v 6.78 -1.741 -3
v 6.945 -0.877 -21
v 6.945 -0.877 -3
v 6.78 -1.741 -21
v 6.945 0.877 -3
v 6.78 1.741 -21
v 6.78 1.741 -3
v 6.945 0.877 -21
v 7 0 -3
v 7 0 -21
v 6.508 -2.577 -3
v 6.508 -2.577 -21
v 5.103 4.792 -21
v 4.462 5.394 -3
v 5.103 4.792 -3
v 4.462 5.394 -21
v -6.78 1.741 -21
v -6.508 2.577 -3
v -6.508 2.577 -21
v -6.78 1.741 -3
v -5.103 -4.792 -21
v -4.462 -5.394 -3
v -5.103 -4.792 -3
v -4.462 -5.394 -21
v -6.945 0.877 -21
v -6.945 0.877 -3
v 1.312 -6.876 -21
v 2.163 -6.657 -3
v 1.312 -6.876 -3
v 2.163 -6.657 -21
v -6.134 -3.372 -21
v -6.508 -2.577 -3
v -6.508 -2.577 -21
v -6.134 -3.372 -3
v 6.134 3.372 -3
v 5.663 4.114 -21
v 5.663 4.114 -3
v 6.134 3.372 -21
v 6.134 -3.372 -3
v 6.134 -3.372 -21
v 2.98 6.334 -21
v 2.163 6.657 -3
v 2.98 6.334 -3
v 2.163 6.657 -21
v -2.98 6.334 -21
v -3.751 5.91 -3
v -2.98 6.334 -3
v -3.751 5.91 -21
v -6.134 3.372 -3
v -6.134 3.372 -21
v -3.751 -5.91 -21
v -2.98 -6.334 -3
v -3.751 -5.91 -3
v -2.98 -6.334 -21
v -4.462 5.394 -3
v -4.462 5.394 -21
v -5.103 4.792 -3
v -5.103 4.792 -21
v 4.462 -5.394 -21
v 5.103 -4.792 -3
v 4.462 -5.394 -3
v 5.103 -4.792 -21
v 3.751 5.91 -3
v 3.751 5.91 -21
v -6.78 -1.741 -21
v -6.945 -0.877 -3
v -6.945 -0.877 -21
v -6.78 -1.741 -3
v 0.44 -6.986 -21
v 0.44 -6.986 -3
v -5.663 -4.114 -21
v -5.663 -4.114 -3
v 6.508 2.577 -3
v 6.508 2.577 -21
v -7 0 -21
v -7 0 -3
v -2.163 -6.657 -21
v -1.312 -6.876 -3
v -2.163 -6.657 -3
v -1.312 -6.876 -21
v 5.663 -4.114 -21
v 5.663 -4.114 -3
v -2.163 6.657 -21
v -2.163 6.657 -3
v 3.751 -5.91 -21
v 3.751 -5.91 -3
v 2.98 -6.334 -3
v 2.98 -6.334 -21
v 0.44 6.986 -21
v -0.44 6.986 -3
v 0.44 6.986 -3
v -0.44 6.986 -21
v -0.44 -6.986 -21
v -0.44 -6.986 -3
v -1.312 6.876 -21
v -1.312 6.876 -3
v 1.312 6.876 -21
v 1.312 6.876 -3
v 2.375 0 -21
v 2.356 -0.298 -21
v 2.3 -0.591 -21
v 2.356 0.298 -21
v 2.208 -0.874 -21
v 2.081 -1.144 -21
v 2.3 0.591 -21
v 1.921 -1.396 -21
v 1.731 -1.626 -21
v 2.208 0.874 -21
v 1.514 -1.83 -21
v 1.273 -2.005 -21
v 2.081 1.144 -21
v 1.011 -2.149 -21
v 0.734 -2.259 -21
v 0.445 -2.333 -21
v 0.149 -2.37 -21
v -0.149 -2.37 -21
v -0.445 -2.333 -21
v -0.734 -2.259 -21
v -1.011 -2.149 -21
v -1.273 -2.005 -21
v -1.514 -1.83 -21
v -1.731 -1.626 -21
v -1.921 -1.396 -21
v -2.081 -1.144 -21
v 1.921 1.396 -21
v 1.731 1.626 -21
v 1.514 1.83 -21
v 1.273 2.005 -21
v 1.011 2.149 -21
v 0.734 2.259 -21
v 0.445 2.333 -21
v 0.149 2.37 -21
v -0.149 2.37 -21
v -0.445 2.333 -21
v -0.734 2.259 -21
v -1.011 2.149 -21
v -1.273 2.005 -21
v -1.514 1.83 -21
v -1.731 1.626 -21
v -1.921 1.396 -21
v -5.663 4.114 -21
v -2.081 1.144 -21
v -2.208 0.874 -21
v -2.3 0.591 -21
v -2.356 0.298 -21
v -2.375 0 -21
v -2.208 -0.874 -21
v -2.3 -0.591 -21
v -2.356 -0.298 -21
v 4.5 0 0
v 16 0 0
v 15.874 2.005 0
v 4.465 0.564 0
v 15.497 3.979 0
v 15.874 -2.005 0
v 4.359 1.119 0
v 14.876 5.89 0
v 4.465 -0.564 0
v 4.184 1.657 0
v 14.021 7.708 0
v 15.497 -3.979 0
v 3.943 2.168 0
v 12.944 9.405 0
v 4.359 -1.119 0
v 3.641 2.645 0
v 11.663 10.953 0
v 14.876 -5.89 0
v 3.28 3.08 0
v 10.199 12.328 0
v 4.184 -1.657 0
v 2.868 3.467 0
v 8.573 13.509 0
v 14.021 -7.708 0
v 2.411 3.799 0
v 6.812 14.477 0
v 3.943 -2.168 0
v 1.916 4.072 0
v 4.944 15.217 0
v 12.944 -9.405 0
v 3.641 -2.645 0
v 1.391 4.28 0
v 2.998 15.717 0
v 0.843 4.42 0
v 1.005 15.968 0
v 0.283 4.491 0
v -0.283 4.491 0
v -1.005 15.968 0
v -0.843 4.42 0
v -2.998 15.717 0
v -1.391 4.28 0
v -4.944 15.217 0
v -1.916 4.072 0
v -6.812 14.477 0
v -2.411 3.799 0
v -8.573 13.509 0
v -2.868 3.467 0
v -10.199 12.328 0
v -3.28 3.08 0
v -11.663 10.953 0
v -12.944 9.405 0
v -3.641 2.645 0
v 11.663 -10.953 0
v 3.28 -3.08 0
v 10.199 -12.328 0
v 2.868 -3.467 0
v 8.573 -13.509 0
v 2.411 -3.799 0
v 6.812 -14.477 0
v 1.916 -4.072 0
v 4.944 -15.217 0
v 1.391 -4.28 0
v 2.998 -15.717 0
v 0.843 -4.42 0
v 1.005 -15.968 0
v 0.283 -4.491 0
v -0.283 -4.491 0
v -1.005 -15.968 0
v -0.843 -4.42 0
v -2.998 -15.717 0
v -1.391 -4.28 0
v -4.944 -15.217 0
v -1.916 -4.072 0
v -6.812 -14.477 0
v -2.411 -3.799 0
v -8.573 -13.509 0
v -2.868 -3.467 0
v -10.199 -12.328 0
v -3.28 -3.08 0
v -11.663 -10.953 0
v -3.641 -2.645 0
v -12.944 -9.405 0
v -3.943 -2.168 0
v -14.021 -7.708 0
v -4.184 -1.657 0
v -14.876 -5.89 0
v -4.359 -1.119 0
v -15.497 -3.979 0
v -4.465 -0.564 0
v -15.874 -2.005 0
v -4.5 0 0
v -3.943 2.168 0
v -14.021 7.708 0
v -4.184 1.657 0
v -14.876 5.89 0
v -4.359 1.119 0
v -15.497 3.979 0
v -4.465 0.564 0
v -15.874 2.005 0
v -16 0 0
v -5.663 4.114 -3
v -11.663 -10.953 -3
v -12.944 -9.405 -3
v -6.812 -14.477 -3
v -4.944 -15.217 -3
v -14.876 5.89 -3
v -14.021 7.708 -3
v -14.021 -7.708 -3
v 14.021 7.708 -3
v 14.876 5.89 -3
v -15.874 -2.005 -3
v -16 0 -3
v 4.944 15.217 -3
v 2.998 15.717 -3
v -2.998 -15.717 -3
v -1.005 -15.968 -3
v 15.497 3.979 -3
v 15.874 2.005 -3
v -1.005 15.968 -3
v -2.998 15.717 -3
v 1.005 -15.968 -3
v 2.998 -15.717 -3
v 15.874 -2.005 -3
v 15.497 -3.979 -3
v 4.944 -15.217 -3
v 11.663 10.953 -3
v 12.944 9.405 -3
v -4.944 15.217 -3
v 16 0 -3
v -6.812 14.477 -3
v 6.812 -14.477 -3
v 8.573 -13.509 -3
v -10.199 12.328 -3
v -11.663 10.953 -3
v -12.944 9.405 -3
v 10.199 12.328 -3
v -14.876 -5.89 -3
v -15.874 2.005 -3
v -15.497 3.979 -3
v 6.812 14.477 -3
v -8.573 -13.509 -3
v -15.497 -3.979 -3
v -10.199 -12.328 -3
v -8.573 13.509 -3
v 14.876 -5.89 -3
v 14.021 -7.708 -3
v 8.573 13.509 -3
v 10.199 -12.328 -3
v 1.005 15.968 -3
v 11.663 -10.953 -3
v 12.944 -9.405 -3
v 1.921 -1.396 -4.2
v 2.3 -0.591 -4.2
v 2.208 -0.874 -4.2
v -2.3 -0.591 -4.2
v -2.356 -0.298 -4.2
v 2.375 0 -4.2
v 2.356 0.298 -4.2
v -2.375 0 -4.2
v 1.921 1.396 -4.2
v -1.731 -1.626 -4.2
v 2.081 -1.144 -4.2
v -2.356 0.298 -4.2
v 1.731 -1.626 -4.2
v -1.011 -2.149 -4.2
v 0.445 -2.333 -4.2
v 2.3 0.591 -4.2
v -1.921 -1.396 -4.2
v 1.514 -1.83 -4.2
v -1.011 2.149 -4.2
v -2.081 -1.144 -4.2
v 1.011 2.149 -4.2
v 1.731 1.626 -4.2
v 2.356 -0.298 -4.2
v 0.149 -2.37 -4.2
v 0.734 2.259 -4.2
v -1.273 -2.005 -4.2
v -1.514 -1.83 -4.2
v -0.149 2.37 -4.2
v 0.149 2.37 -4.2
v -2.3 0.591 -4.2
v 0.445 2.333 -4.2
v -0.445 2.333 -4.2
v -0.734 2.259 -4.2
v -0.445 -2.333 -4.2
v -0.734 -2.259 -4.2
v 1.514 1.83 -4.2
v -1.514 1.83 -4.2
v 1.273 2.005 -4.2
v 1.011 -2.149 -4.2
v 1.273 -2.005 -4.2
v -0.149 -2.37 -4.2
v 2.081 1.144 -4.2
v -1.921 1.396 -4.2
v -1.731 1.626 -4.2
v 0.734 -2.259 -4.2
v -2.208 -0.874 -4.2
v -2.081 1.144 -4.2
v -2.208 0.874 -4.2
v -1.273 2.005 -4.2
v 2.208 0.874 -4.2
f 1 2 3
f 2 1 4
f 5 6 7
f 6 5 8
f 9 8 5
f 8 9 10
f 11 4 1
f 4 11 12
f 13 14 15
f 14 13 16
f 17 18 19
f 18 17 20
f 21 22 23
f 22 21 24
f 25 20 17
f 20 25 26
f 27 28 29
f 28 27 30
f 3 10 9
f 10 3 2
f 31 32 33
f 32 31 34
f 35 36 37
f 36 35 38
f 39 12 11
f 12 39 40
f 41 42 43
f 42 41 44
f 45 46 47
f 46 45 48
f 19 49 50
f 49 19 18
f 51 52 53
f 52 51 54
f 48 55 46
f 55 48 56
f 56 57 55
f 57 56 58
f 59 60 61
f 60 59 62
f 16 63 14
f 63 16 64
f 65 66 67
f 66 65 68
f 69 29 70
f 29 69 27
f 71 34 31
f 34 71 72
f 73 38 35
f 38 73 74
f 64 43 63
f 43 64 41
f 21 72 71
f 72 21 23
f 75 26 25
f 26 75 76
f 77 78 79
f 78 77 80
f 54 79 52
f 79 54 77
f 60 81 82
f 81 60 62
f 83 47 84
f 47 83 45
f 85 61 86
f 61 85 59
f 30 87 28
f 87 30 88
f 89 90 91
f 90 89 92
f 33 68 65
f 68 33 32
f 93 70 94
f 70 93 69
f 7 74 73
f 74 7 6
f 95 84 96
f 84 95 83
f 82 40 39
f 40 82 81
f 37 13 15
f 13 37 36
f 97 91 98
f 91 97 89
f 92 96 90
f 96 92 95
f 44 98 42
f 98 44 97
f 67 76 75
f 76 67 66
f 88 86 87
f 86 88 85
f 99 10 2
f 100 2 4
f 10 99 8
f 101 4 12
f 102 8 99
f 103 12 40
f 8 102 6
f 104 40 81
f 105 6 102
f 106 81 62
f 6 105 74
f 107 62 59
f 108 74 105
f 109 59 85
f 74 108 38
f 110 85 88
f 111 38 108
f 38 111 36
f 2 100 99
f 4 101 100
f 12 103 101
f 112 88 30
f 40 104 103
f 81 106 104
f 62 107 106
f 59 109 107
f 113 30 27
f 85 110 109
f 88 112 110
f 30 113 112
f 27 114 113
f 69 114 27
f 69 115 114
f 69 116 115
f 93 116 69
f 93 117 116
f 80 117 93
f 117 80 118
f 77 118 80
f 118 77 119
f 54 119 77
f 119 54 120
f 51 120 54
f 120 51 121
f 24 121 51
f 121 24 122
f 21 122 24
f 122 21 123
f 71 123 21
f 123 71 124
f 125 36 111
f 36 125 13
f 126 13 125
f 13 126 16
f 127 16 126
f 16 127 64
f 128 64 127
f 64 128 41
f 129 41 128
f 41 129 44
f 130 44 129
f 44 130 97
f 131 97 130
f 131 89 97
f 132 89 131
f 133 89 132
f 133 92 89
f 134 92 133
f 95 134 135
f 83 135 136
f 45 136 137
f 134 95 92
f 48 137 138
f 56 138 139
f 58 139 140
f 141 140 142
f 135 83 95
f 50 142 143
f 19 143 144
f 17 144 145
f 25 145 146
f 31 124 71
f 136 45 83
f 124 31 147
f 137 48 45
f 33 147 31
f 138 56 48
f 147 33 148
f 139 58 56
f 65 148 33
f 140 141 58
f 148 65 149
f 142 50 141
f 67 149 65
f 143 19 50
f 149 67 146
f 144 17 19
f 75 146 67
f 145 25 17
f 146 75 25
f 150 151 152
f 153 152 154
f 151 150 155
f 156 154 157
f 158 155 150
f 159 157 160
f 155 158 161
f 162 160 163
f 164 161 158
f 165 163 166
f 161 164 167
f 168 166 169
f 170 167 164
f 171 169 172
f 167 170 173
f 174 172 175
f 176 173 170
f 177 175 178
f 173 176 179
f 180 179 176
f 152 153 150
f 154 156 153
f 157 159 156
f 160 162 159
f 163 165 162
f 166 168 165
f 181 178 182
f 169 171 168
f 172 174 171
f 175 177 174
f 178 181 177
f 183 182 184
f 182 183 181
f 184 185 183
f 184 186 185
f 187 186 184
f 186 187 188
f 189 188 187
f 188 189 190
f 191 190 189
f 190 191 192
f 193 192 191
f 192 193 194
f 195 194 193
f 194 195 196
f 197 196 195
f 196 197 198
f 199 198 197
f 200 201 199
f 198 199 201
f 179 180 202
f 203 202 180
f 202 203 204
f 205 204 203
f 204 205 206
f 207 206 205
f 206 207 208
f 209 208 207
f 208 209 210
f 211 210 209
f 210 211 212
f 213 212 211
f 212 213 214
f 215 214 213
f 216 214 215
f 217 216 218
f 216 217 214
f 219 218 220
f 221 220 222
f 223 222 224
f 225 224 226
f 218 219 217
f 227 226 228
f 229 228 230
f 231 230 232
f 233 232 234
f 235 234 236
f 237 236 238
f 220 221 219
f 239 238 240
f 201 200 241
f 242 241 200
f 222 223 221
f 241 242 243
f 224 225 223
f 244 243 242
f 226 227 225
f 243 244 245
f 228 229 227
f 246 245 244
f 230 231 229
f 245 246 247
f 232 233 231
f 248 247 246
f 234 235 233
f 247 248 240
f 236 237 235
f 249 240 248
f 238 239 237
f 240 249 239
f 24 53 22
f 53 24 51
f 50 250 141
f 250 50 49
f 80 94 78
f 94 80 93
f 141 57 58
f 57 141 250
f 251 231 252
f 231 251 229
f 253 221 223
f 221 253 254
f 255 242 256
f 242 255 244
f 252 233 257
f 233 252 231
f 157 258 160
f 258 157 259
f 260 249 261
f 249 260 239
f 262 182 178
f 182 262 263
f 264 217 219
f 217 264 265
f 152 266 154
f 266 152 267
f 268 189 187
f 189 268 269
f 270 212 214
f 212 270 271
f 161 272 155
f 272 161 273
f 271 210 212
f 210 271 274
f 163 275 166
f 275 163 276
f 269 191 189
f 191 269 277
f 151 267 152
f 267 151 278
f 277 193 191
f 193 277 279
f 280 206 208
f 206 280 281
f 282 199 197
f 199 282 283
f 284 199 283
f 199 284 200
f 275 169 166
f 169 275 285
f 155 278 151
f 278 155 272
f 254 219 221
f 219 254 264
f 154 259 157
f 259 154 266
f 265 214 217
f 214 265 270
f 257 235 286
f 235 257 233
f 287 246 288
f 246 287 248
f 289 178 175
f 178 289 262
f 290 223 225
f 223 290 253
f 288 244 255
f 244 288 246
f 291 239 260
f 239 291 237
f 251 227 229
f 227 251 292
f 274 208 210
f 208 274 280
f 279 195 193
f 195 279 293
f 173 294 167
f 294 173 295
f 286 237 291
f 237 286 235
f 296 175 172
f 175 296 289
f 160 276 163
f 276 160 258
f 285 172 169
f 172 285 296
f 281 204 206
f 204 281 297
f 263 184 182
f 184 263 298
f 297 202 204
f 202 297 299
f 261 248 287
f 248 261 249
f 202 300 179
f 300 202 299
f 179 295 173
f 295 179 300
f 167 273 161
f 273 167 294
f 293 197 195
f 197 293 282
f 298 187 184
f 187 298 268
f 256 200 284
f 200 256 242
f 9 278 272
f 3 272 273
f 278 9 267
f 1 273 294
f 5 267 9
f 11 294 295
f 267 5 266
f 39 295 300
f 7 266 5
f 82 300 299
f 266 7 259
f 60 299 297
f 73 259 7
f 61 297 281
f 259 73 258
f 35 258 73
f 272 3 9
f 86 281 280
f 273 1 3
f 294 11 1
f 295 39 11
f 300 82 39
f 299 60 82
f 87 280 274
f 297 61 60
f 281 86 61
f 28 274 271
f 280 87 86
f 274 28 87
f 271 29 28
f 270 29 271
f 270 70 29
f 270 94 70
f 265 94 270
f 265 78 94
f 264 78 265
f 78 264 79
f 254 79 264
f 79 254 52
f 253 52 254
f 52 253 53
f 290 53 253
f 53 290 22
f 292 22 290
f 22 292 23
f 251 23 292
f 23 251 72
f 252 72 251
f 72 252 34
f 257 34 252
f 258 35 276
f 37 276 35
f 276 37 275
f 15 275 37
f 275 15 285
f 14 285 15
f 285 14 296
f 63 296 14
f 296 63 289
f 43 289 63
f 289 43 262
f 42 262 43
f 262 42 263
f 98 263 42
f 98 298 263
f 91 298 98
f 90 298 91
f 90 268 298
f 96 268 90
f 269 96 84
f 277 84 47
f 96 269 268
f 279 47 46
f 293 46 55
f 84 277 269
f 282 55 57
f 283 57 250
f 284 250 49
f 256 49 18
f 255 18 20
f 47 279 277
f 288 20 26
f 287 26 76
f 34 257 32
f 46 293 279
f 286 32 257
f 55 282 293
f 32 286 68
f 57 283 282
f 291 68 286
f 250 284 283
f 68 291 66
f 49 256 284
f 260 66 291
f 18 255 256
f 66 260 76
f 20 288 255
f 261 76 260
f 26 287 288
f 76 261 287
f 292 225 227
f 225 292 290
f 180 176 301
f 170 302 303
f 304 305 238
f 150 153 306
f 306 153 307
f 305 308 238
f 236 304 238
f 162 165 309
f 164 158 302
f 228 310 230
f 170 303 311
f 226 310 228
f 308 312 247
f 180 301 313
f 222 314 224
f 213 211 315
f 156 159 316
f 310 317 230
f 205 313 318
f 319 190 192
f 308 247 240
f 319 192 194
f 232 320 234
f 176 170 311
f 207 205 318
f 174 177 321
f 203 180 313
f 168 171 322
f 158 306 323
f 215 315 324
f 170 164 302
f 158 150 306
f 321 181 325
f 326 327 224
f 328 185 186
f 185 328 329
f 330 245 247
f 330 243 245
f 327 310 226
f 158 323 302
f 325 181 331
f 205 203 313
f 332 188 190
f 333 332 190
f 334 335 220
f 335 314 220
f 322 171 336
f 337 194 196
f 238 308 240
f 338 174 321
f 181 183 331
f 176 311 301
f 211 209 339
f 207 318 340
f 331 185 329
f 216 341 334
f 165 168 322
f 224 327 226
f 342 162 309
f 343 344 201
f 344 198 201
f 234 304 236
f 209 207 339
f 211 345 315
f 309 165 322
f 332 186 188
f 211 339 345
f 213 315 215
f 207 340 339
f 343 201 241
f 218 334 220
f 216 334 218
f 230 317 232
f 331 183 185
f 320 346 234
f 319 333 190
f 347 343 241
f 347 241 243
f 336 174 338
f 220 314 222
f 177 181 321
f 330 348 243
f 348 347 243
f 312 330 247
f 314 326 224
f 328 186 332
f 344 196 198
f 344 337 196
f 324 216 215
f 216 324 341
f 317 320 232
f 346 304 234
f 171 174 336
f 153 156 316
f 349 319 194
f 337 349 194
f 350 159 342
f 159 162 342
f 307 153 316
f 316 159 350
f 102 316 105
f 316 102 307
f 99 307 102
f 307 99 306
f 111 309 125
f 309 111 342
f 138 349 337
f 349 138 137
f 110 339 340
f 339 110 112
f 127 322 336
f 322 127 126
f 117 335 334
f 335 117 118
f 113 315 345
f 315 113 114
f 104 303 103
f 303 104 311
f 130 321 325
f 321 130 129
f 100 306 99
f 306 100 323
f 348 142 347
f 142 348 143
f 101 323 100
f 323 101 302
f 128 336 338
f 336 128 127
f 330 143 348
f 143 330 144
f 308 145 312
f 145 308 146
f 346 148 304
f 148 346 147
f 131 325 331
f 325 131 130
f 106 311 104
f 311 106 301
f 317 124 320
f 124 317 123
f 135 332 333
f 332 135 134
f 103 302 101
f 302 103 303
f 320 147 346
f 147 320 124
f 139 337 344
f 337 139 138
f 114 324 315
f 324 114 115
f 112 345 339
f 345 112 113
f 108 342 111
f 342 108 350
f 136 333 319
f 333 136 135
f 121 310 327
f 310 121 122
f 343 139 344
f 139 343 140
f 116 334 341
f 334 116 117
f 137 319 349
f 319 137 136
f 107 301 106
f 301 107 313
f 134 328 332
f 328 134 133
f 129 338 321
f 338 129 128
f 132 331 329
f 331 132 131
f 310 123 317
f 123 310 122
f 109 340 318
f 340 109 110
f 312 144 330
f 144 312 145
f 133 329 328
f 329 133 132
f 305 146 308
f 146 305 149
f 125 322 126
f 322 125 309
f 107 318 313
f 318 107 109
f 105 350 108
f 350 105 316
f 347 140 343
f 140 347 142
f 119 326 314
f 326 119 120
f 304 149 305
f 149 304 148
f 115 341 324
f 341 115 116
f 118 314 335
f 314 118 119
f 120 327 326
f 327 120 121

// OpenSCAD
$fn = 50;


difference() {
	union() {
		translate(v = [0, 0, -21.0000000000]) {
			cylinder(h = 21, r = 7.0000000000);
		}
		translate(v = [0, 0, -3.0000000000]) {
			cylinder(h = 3, r = 16.0000000000);
		}
	}
	union() {
		translate(v = [0, 0, 0]) {
			rotate(a = [0, 0, 0]) {
				difference() {
					union() {
						#translate(v = [0, 0, -21.0000000000]) {
							cylinder(h = 21, r = 2.2500000000);
						}
						#translate(v = [0, 0, -4.2000000000]) {
							cylinder(h = 4.2000000000, r = 7.0000000000, r1 = 2.3750000000, r2 = 4.5000000000);
						}
						#translate(v = [0, 0, -21.0000000000]) {
							cylinder(h = 21, r = 2.3750000000);
						}
						#translate(v = [0, 0, -21.0000000000]) {
							cylinder(h = 21, r = 2.2500000000);
						}
					}
					union();
				}
			}
		}
	}
}
